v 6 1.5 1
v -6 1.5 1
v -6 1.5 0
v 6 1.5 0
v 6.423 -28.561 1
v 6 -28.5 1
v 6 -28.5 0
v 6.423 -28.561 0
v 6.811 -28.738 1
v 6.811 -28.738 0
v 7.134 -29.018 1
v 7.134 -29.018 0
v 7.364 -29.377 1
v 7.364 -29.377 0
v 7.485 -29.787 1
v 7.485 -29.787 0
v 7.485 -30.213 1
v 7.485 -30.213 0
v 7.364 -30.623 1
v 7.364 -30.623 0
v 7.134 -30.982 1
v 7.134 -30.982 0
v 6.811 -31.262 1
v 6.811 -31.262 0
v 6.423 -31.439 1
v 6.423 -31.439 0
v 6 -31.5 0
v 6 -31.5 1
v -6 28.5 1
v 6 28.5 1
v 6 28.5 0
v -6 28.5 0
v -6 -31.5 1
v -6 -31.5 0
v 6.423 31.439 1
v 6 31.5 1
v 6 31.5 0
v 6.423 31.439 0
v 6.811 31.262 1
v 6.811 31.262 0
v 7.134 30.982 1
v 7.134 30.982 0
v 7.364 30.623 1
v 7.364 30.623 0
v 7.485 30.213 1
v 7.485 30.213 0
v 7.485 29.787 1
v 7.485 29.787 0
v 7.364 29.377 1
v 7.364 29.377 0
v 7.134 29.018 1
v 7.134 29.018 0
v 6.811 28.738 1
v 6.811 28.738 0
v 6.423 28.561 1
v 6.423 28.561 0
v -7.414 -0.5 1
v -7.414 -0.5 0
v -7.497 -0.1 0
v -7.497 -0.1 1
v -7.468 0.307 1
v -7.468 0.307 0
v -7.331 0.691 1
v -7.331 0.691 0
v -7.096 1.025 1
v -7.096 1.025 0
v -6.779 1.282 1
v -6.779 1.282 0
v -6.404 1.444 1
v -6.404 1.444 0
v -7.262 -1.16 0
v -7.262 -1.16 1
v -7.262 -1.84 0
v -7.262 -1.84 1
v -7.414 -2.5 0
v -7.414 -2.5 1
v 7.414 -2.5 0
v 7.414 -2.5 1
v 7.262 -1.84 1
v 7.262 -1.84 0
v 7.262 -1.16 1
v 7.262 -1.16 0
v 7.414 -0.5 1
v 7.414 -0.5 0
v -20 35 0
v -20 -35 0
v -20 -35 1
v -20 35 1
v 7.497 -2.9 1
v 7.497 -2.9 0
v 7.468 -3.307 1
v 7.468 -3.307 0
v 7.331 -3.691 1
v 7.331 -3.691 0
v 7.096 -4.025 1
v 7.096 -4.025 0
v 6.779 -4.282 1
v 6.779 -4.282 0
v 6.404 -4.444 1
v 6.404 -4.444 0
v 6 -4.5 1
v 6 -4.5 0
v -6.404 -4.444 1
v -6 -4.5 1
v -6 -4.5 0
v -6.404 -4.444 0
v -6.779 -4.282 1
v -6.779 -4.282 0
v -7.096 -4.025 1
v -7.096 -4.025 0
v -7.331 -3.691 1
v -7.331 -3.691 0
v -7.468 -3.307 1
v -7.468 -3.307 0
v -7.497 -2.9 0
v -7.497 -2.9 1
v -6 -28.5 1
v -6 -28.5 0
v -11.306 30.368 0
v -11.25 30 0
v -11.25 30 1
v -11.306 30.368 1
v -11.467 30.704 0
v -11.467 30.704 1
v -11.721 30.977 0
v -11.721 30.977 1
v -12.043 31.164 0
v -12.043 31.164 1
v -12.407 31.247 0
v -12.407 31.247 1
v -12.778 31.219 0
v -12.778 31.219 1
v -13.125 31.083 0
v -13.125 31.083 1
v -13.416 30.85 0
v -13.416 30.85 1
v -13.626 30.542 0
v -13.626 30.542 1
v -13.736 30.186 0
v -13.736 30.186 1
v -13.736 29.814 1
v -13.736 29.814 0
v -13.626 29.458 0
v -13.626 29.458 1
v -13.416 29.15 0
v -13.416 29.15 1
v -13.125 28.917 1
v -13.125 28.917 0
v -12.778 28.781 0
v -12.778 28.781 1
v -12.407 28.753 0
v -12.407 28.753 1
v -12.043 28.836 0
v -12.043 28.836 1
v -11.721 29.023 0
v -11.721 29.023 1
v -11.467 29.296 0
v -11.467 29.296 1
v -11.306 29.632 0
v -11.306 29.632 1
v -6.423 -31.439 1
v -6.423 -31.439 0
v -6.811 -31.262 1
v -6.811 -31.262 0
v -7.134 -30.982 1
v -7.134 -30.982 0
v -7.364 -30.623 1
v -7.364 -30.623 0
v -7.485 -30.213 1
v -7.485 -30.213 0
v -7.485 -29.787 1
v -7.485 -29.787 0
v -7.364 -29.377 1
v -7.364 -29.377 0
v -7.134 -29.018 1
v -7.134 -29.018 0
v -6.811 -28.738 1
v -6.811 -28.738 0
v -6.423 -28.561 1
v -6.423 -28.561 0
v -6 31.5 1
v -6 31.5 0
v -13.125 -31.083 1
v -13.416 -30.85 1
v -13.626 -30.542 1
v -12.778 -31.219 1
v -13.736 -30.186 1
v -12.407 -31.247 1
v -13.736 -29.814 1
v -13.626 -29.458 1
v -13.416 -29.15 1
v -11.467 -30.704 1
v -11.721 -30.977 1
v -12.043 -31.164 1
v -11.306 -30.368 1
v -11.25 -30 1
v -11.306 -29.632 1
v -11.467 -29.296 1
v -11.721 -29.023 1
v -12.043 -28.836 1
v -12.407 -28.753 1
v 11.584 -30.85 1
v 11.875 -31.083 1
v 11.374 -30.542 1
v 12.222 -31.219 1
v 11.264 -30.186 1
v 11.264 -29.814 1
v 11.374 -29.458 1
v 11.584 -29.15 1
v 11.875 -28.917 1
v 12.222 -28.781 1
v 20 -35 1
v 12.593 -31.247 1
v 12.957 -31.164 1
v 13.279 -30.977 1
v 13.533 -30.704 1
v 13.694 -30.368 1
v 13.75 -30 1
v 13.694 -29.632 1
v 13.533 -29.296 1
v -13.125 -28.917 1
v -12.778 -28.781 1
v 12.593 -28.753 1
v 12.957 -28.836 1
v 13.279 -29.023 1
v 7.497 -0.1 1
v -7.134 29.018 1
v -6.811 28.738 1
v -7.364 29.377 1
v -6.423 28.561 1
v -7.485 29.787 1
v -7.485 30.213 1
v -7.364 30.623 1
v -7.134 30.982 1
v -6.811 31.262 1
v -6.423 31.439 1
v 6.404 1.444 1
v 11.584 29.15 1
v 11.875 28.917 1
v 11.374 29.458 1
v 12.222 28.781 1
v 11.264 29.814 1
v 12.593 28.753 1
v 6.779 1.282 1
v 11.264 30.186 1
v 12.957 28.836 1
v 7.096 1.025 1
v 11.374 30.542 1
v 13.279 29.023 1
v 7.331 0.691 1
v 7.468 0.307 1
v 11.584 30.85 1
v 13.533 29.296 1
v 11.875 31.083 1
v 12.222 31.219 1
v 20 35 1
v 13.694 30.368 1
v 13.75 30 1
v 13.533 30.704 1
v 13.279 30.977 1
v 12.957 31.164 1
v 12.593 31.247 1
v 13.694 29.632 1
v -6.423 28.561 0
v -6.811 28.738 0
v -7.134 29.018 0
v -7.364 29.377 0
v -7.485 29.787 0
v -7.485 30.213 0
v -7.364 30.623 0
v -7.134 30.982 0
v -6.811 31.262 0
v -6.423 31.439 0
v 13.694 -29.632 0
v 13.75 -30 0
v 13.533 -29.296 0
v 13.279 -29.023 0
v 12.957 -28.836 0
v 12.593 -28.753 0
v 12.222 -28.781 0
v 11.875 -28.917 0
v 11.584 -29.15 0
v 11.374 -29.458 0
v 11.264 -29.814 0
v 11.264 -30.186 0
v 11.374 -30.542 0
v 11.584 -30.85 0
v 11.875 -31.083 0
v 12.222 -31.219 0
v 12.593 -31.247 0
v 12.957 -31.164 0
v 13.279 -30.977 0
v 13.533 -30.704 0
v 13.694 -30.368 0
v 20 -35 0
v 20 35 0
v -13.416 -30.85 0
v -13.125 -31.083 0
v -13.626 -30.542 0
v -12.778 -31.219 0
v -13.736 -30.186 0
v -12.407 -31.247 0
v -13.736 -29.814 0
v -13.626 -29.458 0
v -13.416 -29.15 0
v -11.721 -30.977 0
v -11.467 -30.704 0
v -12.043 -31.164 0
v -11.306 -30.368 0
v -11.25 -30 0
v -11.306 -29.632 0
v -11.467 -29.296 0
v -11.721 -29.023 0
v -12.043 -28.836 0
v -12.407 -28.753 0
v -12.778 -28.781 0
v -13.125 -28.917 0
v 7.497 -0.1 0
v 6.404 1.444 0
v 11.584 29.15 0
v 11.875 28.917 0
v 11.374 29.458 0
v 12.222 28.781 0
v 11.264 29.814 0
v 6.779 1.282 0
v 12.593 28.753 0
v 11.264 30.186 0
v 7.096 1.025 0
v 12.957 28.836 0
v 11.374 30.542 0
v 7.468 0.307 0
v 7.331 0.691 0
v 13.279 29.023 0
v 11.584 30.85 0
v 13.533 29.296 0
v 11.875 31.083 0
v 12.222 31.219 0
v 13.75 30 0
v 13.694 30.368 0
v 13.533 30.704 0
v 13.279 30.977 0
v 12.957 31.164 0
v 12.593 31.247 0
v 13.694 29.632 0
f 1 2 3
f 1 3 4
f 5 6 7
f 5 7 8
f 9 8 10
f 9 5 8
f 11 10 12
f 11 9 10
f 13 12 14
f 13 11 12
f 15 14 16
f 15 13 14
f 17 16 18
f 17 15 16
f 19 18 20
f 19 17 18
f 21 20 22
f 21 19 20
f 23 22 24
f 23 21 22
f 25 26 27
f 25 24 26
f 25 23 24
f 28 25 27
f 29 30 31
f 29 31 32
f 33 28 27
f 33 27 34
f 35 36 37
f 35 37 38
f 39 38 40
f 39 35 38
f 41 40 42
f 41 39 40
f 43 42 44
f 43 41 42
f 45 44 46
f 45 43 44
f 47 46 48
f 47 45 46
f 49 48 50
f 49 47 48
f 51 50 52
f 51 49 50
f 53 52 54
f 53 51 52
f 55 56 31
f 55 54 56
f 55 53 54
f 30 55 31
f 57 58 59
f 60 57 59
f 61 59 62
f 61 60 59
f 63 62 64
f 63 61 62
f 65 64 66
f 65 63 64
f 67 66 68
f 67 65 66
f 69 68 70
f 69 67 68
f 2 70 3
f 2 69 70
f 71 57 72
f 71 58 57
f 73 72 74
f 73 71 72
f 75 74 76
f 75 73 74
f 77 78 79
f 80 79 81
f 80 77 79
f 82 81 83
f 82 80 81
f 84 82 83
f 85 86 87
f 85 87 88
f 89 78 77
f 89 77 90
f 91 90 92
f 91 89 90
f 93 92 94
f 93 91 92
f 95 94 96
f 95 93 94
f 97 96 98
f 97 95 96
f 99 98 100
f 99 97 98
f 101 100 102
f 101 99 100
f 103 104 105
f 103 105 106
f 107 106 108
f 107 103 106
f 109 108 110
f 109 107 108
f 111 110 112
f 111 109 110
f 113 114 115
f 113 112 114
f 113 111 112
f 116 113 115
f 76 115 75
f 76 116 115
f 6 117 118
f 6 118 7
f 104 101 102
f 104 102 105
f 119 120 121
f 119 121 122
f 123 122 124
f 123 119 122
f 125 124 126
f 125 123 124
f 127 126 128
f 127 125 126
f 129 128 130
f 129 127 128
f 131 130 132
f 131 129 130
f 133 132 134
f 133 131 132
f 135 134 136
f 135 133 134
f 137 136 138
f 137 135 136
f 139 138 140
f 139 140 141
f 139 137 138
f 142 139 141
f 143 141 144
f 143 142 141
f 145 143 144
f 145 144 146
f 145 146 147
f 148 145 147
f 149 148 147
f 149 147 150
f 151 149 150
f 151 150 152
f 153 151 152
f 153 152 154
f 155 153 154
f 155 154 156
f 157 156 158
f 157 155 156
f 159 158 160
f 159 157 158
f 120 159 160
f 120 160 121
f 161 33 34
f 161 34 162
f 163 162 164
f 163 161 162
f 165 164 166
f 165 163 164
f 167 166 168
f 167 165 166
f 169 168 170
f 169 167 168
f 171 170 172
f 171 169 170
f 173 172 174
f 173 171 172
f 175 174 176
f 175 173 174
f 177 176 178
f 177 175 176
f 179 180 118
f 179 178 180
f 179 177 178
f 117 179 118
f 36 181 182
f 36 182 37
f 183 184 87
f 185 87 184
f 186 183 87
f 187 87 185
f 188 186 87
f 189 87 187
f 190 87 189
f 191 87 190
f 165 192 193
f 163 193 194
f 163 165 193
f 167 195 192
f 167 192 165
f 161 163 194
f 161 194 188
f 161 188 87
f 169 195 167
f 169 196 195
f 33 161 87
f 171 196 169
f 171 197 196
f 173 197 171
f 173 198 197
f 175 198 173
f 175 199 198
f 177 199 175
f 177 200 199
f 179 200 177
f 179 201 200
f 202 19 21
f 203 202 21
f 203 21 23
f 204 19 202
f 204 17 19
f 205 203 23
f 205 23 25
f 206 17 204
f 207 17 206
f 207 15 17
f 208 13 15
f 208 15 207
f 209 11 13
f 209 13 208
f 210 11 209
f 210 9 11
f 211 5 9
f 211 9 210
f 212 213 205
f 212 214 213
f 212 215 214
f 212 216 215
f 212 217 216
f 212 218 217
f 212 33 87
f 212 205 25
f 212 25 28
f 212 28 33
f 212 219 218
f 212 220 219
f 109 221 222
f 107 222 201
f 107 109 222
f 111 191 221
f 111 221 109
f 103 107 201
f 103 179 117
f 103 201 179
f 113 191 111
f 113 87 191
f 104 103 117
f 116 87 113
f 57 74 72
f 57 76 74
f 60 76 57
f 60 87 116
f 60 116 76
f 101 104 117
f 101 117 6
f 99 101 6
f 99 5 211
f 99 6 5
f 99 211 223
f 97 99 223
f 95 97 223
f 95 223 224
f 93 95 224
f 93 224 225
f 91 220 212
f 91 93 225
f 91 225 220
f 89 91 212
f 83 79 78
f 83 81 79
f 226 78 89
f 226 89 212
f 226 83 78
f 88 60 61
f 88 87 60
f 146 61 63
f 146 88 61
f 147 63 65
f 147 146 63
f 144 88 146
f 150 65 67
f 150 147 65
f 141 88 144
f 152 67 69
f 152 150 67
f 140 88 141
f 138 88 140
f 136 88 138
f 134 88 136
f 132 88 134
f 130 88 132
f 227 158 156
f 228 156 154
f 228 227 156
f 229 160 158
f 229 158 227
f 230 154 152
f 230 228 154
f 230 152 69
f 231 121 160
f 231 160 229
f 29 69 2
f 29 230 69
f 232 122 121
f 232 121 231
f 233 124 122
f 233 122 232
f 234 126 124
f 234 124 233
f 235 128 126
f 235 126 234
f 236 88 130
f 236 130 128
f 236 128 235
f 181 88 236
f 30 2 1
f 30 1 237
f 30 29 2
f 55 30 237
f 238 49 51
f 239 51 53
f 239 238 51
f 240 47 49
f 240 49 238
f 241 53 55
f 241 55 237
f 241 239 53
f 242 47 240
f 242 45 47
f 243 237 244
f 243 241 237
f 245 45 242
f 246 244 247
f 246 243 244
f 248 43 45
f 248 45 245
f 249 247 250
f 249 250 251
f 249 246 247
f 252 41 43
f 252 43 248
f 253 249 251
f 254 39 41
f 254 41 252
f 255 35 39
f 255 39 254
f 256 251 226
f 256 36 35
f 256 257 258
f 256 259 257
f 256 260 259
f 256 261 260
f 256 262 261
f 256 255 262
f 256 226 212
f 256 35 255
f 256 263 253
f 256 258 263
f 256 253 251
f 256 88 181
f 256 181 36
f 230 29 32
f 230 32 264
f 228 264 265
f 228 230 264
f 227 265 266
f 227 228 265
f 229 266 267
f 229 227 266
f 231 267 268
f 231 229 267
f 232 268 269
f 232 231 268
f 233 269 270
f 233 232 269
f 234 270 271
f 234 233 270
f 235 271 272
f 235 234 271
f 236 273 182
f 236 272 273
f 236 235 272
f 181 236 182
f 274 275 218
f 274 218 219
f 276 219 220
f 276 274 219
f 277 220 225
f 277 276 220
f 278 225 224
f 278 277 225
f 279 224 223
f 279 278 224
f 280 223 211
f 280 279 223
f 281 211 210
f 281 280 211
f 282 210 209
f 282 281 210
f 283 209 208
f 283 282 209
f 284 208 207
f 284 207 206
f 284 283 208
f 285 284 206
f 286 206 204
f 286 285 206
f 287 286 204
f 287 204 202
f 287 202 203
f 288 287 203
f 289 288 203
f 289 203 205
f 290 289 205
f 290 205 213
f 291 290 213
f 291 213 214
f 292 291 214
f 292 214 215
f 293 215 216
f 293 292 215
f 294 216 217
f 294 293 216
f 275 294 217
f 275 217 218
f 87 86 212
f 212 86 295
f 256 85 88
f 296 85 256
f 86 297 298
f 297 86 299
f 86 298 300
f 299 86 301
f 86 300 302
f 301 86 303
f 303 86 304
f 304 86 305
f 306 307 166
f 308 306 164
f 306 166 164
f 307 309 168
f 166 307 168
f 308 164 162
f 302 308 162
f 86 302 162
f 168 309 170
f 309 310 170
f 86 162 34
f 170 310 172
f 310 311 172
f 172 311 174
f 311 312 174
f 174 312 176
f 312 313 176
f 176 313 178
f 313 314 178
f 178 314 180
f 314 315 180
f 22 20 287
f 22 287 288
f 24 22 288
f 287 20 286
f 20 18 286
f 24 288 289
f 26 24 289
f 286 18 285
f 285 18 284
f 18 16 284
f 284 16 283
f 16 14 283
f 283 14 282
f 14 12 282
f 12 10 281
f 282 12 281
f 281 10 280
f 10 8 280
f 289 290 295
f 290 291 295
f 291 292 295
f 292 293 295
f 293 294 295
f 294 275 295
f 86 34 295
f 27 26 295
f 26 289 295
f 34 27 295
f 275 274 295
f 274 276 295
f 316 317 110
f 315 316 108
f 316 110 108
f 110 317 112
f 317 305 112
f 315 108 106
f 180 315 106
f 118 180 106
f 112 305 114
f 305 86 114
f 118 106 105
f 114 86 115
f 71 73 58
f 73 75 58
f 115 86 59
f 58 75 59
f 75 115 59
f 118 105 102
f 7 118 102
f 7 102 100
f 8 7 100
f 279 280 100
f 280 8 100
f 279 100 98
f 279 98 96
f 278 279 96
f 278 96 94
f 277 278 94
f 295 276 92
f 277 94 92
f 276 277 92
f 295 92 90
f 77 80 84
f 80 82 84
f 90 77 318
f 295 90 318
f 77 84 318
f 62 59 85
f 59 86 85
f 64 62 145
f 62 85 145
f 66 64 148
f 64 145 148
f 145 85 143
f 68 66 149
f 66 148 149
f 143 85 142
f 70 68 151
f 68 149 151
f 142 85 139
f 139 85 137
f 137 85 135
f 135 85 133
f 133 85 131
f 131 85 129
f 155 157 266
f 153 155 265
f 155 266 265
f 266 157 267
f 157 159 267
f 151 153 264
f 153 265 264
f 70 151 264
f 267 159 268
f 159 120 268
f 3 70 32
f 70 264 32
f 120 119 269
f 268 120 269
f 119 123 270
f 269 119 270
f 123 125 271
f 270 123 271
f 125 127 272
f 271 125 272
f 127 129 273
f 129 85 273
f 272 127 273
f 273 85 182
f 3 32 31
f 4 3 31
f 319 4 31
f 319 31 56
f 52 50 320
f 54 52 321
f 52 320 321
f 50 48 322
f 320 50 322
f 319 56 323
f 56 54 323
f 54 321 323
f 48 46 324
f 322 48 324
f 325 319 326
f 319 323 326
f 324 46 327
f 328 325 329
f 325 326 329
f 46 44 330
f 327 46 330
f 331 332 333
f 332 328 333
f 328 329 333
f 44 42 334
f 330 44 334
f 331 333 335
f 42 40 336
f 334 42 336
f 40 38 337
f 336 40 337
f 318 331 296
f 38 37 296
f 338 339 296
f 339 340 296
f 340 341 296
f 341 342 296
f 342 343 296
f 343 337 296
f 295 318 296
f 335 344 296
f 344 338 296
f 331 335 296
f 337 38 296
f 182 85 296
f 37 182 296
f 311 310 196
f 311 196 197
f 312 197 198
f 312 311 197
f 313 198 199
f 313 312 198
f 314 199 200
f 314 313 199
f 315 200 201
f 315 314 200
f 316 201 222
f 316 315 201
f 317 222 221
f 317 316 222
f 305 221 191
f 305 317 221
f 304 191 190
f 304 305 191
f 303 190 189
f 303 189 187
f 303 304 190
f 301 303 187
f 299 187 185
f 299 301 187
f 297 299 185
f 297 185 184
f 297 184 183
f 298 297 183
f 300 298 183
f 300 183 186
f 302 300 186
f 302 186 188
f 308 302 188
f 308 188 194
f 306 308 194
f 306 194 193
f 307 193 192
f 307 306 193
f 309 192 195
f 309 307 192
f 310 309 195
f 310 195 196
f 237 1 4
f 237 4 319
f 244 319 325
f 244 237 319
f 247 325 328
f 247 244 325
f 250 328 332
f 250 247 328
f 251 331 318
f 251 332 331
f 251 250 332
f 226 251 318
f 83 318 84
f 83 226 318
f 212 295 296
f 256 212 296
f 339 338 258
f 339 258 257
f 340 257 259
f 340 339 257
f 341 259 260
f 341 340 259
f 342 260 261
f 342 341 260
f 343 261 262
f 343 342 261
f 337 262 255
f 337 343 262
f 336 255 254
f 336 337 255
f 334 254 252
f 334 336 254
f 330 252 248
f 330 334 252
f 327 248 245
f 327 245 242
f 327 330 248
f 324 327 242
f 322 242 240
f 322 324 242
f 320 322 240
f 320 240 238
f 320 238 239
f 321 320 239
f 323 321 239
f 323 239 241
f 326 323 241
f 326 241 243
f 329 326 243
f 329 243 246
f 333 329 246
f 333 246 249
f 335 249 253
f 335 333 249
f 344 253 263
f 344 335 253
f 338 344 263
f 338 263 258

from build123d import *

# Parameters (mm, degrees)
SKETCH1_W           = 40
SKETCH1_H           = 70
SKETCH1_R           = 1.25
BOSS_EXTRUDE1_DEPTH = 1
CUT_EXTRUDE1_DEPTH  = 41.323690307
FILLET1_R           = 3


with BuildPart() as part:
    # Sketch1 → Boss-Extrude1 (new body)
    with BuildSketch(Plane.XY):
        Rectangle(SKETCH1_W, SKETCH1_H)
        with Locations((-12.5, 30)):
            Circle(SKETCH1_R, mode=Mode.SUBTRACT)
        with Locations((12.5, 30)):
            Circle(SKETCH1_R, mode=Mode.SUBTRACT)
        with Locations((-12.5, -30)):
            Circle(SKETCH1_R, mode=Mode.SUBTRACT)
        with Locations((12.5, -30)):
            Circle(SKETCH1_R, mode=Mode.SUBTRACT)
    extrude(amount=BOSS_EXTRUDE1_DEPTH)

    # Sketch2 → Cut-Extrude1 (cut, through all)
    with BuildSketch(Plane.XY.offset(1)):
        with BuildLine():
            Line((-6, 31.5), (6, 31.5))
            ThreePointArc((6, 31.5), (7.5, 30), (6, 28.5))
            Line((6, 28.5), (-6, 28.5))
            ThreePointArc((-6, 28.5), (-7.5, 30), (-6, 31.5))
        make_face()
        with BuildLine():
            Line((-6, 1.5), (6, 1.5))
            ThreePointArc((6, 1.5), (7.5, 0), (6, -1.5))
            ThreePointArc((6, -1.5), (7.5, -3), (6, -4.5))
            Line((6, -4.5), (-6, -4.5))
            ThreePointArc((-6, -4.5), (-7.5, -3), (-6, -1.5))
            ThreePointArc((-6, -1.5), (-7.5, 0), (-6, 1.5))
        make_face()
        with BuildLine():
            Line((-6, -28.5), (6, -28.5))
            ThreePointArc((6, -28.5), (7.5, -30), (6, -31.5))
            Line((6, -31.5), (-6, -31.5))
            ThreePointArc((-6, -31.5), (-7.5, -30), (-6, -28.5))
        make_face()
    extrude(amount=-CUT_EXTRUDE1_DEPTH, mode=Mode.SUBTRACT)

    # Fillet1
    fillet1_edges = [part.edges().sort_by_distance(p)[0] for p in [
        (-6, -1.5, 0.5),
        (6, -1.5, 0.5),
    ]]
    fillet(fillet1_edges, radius=FILLET1_R)


solid = part.part
